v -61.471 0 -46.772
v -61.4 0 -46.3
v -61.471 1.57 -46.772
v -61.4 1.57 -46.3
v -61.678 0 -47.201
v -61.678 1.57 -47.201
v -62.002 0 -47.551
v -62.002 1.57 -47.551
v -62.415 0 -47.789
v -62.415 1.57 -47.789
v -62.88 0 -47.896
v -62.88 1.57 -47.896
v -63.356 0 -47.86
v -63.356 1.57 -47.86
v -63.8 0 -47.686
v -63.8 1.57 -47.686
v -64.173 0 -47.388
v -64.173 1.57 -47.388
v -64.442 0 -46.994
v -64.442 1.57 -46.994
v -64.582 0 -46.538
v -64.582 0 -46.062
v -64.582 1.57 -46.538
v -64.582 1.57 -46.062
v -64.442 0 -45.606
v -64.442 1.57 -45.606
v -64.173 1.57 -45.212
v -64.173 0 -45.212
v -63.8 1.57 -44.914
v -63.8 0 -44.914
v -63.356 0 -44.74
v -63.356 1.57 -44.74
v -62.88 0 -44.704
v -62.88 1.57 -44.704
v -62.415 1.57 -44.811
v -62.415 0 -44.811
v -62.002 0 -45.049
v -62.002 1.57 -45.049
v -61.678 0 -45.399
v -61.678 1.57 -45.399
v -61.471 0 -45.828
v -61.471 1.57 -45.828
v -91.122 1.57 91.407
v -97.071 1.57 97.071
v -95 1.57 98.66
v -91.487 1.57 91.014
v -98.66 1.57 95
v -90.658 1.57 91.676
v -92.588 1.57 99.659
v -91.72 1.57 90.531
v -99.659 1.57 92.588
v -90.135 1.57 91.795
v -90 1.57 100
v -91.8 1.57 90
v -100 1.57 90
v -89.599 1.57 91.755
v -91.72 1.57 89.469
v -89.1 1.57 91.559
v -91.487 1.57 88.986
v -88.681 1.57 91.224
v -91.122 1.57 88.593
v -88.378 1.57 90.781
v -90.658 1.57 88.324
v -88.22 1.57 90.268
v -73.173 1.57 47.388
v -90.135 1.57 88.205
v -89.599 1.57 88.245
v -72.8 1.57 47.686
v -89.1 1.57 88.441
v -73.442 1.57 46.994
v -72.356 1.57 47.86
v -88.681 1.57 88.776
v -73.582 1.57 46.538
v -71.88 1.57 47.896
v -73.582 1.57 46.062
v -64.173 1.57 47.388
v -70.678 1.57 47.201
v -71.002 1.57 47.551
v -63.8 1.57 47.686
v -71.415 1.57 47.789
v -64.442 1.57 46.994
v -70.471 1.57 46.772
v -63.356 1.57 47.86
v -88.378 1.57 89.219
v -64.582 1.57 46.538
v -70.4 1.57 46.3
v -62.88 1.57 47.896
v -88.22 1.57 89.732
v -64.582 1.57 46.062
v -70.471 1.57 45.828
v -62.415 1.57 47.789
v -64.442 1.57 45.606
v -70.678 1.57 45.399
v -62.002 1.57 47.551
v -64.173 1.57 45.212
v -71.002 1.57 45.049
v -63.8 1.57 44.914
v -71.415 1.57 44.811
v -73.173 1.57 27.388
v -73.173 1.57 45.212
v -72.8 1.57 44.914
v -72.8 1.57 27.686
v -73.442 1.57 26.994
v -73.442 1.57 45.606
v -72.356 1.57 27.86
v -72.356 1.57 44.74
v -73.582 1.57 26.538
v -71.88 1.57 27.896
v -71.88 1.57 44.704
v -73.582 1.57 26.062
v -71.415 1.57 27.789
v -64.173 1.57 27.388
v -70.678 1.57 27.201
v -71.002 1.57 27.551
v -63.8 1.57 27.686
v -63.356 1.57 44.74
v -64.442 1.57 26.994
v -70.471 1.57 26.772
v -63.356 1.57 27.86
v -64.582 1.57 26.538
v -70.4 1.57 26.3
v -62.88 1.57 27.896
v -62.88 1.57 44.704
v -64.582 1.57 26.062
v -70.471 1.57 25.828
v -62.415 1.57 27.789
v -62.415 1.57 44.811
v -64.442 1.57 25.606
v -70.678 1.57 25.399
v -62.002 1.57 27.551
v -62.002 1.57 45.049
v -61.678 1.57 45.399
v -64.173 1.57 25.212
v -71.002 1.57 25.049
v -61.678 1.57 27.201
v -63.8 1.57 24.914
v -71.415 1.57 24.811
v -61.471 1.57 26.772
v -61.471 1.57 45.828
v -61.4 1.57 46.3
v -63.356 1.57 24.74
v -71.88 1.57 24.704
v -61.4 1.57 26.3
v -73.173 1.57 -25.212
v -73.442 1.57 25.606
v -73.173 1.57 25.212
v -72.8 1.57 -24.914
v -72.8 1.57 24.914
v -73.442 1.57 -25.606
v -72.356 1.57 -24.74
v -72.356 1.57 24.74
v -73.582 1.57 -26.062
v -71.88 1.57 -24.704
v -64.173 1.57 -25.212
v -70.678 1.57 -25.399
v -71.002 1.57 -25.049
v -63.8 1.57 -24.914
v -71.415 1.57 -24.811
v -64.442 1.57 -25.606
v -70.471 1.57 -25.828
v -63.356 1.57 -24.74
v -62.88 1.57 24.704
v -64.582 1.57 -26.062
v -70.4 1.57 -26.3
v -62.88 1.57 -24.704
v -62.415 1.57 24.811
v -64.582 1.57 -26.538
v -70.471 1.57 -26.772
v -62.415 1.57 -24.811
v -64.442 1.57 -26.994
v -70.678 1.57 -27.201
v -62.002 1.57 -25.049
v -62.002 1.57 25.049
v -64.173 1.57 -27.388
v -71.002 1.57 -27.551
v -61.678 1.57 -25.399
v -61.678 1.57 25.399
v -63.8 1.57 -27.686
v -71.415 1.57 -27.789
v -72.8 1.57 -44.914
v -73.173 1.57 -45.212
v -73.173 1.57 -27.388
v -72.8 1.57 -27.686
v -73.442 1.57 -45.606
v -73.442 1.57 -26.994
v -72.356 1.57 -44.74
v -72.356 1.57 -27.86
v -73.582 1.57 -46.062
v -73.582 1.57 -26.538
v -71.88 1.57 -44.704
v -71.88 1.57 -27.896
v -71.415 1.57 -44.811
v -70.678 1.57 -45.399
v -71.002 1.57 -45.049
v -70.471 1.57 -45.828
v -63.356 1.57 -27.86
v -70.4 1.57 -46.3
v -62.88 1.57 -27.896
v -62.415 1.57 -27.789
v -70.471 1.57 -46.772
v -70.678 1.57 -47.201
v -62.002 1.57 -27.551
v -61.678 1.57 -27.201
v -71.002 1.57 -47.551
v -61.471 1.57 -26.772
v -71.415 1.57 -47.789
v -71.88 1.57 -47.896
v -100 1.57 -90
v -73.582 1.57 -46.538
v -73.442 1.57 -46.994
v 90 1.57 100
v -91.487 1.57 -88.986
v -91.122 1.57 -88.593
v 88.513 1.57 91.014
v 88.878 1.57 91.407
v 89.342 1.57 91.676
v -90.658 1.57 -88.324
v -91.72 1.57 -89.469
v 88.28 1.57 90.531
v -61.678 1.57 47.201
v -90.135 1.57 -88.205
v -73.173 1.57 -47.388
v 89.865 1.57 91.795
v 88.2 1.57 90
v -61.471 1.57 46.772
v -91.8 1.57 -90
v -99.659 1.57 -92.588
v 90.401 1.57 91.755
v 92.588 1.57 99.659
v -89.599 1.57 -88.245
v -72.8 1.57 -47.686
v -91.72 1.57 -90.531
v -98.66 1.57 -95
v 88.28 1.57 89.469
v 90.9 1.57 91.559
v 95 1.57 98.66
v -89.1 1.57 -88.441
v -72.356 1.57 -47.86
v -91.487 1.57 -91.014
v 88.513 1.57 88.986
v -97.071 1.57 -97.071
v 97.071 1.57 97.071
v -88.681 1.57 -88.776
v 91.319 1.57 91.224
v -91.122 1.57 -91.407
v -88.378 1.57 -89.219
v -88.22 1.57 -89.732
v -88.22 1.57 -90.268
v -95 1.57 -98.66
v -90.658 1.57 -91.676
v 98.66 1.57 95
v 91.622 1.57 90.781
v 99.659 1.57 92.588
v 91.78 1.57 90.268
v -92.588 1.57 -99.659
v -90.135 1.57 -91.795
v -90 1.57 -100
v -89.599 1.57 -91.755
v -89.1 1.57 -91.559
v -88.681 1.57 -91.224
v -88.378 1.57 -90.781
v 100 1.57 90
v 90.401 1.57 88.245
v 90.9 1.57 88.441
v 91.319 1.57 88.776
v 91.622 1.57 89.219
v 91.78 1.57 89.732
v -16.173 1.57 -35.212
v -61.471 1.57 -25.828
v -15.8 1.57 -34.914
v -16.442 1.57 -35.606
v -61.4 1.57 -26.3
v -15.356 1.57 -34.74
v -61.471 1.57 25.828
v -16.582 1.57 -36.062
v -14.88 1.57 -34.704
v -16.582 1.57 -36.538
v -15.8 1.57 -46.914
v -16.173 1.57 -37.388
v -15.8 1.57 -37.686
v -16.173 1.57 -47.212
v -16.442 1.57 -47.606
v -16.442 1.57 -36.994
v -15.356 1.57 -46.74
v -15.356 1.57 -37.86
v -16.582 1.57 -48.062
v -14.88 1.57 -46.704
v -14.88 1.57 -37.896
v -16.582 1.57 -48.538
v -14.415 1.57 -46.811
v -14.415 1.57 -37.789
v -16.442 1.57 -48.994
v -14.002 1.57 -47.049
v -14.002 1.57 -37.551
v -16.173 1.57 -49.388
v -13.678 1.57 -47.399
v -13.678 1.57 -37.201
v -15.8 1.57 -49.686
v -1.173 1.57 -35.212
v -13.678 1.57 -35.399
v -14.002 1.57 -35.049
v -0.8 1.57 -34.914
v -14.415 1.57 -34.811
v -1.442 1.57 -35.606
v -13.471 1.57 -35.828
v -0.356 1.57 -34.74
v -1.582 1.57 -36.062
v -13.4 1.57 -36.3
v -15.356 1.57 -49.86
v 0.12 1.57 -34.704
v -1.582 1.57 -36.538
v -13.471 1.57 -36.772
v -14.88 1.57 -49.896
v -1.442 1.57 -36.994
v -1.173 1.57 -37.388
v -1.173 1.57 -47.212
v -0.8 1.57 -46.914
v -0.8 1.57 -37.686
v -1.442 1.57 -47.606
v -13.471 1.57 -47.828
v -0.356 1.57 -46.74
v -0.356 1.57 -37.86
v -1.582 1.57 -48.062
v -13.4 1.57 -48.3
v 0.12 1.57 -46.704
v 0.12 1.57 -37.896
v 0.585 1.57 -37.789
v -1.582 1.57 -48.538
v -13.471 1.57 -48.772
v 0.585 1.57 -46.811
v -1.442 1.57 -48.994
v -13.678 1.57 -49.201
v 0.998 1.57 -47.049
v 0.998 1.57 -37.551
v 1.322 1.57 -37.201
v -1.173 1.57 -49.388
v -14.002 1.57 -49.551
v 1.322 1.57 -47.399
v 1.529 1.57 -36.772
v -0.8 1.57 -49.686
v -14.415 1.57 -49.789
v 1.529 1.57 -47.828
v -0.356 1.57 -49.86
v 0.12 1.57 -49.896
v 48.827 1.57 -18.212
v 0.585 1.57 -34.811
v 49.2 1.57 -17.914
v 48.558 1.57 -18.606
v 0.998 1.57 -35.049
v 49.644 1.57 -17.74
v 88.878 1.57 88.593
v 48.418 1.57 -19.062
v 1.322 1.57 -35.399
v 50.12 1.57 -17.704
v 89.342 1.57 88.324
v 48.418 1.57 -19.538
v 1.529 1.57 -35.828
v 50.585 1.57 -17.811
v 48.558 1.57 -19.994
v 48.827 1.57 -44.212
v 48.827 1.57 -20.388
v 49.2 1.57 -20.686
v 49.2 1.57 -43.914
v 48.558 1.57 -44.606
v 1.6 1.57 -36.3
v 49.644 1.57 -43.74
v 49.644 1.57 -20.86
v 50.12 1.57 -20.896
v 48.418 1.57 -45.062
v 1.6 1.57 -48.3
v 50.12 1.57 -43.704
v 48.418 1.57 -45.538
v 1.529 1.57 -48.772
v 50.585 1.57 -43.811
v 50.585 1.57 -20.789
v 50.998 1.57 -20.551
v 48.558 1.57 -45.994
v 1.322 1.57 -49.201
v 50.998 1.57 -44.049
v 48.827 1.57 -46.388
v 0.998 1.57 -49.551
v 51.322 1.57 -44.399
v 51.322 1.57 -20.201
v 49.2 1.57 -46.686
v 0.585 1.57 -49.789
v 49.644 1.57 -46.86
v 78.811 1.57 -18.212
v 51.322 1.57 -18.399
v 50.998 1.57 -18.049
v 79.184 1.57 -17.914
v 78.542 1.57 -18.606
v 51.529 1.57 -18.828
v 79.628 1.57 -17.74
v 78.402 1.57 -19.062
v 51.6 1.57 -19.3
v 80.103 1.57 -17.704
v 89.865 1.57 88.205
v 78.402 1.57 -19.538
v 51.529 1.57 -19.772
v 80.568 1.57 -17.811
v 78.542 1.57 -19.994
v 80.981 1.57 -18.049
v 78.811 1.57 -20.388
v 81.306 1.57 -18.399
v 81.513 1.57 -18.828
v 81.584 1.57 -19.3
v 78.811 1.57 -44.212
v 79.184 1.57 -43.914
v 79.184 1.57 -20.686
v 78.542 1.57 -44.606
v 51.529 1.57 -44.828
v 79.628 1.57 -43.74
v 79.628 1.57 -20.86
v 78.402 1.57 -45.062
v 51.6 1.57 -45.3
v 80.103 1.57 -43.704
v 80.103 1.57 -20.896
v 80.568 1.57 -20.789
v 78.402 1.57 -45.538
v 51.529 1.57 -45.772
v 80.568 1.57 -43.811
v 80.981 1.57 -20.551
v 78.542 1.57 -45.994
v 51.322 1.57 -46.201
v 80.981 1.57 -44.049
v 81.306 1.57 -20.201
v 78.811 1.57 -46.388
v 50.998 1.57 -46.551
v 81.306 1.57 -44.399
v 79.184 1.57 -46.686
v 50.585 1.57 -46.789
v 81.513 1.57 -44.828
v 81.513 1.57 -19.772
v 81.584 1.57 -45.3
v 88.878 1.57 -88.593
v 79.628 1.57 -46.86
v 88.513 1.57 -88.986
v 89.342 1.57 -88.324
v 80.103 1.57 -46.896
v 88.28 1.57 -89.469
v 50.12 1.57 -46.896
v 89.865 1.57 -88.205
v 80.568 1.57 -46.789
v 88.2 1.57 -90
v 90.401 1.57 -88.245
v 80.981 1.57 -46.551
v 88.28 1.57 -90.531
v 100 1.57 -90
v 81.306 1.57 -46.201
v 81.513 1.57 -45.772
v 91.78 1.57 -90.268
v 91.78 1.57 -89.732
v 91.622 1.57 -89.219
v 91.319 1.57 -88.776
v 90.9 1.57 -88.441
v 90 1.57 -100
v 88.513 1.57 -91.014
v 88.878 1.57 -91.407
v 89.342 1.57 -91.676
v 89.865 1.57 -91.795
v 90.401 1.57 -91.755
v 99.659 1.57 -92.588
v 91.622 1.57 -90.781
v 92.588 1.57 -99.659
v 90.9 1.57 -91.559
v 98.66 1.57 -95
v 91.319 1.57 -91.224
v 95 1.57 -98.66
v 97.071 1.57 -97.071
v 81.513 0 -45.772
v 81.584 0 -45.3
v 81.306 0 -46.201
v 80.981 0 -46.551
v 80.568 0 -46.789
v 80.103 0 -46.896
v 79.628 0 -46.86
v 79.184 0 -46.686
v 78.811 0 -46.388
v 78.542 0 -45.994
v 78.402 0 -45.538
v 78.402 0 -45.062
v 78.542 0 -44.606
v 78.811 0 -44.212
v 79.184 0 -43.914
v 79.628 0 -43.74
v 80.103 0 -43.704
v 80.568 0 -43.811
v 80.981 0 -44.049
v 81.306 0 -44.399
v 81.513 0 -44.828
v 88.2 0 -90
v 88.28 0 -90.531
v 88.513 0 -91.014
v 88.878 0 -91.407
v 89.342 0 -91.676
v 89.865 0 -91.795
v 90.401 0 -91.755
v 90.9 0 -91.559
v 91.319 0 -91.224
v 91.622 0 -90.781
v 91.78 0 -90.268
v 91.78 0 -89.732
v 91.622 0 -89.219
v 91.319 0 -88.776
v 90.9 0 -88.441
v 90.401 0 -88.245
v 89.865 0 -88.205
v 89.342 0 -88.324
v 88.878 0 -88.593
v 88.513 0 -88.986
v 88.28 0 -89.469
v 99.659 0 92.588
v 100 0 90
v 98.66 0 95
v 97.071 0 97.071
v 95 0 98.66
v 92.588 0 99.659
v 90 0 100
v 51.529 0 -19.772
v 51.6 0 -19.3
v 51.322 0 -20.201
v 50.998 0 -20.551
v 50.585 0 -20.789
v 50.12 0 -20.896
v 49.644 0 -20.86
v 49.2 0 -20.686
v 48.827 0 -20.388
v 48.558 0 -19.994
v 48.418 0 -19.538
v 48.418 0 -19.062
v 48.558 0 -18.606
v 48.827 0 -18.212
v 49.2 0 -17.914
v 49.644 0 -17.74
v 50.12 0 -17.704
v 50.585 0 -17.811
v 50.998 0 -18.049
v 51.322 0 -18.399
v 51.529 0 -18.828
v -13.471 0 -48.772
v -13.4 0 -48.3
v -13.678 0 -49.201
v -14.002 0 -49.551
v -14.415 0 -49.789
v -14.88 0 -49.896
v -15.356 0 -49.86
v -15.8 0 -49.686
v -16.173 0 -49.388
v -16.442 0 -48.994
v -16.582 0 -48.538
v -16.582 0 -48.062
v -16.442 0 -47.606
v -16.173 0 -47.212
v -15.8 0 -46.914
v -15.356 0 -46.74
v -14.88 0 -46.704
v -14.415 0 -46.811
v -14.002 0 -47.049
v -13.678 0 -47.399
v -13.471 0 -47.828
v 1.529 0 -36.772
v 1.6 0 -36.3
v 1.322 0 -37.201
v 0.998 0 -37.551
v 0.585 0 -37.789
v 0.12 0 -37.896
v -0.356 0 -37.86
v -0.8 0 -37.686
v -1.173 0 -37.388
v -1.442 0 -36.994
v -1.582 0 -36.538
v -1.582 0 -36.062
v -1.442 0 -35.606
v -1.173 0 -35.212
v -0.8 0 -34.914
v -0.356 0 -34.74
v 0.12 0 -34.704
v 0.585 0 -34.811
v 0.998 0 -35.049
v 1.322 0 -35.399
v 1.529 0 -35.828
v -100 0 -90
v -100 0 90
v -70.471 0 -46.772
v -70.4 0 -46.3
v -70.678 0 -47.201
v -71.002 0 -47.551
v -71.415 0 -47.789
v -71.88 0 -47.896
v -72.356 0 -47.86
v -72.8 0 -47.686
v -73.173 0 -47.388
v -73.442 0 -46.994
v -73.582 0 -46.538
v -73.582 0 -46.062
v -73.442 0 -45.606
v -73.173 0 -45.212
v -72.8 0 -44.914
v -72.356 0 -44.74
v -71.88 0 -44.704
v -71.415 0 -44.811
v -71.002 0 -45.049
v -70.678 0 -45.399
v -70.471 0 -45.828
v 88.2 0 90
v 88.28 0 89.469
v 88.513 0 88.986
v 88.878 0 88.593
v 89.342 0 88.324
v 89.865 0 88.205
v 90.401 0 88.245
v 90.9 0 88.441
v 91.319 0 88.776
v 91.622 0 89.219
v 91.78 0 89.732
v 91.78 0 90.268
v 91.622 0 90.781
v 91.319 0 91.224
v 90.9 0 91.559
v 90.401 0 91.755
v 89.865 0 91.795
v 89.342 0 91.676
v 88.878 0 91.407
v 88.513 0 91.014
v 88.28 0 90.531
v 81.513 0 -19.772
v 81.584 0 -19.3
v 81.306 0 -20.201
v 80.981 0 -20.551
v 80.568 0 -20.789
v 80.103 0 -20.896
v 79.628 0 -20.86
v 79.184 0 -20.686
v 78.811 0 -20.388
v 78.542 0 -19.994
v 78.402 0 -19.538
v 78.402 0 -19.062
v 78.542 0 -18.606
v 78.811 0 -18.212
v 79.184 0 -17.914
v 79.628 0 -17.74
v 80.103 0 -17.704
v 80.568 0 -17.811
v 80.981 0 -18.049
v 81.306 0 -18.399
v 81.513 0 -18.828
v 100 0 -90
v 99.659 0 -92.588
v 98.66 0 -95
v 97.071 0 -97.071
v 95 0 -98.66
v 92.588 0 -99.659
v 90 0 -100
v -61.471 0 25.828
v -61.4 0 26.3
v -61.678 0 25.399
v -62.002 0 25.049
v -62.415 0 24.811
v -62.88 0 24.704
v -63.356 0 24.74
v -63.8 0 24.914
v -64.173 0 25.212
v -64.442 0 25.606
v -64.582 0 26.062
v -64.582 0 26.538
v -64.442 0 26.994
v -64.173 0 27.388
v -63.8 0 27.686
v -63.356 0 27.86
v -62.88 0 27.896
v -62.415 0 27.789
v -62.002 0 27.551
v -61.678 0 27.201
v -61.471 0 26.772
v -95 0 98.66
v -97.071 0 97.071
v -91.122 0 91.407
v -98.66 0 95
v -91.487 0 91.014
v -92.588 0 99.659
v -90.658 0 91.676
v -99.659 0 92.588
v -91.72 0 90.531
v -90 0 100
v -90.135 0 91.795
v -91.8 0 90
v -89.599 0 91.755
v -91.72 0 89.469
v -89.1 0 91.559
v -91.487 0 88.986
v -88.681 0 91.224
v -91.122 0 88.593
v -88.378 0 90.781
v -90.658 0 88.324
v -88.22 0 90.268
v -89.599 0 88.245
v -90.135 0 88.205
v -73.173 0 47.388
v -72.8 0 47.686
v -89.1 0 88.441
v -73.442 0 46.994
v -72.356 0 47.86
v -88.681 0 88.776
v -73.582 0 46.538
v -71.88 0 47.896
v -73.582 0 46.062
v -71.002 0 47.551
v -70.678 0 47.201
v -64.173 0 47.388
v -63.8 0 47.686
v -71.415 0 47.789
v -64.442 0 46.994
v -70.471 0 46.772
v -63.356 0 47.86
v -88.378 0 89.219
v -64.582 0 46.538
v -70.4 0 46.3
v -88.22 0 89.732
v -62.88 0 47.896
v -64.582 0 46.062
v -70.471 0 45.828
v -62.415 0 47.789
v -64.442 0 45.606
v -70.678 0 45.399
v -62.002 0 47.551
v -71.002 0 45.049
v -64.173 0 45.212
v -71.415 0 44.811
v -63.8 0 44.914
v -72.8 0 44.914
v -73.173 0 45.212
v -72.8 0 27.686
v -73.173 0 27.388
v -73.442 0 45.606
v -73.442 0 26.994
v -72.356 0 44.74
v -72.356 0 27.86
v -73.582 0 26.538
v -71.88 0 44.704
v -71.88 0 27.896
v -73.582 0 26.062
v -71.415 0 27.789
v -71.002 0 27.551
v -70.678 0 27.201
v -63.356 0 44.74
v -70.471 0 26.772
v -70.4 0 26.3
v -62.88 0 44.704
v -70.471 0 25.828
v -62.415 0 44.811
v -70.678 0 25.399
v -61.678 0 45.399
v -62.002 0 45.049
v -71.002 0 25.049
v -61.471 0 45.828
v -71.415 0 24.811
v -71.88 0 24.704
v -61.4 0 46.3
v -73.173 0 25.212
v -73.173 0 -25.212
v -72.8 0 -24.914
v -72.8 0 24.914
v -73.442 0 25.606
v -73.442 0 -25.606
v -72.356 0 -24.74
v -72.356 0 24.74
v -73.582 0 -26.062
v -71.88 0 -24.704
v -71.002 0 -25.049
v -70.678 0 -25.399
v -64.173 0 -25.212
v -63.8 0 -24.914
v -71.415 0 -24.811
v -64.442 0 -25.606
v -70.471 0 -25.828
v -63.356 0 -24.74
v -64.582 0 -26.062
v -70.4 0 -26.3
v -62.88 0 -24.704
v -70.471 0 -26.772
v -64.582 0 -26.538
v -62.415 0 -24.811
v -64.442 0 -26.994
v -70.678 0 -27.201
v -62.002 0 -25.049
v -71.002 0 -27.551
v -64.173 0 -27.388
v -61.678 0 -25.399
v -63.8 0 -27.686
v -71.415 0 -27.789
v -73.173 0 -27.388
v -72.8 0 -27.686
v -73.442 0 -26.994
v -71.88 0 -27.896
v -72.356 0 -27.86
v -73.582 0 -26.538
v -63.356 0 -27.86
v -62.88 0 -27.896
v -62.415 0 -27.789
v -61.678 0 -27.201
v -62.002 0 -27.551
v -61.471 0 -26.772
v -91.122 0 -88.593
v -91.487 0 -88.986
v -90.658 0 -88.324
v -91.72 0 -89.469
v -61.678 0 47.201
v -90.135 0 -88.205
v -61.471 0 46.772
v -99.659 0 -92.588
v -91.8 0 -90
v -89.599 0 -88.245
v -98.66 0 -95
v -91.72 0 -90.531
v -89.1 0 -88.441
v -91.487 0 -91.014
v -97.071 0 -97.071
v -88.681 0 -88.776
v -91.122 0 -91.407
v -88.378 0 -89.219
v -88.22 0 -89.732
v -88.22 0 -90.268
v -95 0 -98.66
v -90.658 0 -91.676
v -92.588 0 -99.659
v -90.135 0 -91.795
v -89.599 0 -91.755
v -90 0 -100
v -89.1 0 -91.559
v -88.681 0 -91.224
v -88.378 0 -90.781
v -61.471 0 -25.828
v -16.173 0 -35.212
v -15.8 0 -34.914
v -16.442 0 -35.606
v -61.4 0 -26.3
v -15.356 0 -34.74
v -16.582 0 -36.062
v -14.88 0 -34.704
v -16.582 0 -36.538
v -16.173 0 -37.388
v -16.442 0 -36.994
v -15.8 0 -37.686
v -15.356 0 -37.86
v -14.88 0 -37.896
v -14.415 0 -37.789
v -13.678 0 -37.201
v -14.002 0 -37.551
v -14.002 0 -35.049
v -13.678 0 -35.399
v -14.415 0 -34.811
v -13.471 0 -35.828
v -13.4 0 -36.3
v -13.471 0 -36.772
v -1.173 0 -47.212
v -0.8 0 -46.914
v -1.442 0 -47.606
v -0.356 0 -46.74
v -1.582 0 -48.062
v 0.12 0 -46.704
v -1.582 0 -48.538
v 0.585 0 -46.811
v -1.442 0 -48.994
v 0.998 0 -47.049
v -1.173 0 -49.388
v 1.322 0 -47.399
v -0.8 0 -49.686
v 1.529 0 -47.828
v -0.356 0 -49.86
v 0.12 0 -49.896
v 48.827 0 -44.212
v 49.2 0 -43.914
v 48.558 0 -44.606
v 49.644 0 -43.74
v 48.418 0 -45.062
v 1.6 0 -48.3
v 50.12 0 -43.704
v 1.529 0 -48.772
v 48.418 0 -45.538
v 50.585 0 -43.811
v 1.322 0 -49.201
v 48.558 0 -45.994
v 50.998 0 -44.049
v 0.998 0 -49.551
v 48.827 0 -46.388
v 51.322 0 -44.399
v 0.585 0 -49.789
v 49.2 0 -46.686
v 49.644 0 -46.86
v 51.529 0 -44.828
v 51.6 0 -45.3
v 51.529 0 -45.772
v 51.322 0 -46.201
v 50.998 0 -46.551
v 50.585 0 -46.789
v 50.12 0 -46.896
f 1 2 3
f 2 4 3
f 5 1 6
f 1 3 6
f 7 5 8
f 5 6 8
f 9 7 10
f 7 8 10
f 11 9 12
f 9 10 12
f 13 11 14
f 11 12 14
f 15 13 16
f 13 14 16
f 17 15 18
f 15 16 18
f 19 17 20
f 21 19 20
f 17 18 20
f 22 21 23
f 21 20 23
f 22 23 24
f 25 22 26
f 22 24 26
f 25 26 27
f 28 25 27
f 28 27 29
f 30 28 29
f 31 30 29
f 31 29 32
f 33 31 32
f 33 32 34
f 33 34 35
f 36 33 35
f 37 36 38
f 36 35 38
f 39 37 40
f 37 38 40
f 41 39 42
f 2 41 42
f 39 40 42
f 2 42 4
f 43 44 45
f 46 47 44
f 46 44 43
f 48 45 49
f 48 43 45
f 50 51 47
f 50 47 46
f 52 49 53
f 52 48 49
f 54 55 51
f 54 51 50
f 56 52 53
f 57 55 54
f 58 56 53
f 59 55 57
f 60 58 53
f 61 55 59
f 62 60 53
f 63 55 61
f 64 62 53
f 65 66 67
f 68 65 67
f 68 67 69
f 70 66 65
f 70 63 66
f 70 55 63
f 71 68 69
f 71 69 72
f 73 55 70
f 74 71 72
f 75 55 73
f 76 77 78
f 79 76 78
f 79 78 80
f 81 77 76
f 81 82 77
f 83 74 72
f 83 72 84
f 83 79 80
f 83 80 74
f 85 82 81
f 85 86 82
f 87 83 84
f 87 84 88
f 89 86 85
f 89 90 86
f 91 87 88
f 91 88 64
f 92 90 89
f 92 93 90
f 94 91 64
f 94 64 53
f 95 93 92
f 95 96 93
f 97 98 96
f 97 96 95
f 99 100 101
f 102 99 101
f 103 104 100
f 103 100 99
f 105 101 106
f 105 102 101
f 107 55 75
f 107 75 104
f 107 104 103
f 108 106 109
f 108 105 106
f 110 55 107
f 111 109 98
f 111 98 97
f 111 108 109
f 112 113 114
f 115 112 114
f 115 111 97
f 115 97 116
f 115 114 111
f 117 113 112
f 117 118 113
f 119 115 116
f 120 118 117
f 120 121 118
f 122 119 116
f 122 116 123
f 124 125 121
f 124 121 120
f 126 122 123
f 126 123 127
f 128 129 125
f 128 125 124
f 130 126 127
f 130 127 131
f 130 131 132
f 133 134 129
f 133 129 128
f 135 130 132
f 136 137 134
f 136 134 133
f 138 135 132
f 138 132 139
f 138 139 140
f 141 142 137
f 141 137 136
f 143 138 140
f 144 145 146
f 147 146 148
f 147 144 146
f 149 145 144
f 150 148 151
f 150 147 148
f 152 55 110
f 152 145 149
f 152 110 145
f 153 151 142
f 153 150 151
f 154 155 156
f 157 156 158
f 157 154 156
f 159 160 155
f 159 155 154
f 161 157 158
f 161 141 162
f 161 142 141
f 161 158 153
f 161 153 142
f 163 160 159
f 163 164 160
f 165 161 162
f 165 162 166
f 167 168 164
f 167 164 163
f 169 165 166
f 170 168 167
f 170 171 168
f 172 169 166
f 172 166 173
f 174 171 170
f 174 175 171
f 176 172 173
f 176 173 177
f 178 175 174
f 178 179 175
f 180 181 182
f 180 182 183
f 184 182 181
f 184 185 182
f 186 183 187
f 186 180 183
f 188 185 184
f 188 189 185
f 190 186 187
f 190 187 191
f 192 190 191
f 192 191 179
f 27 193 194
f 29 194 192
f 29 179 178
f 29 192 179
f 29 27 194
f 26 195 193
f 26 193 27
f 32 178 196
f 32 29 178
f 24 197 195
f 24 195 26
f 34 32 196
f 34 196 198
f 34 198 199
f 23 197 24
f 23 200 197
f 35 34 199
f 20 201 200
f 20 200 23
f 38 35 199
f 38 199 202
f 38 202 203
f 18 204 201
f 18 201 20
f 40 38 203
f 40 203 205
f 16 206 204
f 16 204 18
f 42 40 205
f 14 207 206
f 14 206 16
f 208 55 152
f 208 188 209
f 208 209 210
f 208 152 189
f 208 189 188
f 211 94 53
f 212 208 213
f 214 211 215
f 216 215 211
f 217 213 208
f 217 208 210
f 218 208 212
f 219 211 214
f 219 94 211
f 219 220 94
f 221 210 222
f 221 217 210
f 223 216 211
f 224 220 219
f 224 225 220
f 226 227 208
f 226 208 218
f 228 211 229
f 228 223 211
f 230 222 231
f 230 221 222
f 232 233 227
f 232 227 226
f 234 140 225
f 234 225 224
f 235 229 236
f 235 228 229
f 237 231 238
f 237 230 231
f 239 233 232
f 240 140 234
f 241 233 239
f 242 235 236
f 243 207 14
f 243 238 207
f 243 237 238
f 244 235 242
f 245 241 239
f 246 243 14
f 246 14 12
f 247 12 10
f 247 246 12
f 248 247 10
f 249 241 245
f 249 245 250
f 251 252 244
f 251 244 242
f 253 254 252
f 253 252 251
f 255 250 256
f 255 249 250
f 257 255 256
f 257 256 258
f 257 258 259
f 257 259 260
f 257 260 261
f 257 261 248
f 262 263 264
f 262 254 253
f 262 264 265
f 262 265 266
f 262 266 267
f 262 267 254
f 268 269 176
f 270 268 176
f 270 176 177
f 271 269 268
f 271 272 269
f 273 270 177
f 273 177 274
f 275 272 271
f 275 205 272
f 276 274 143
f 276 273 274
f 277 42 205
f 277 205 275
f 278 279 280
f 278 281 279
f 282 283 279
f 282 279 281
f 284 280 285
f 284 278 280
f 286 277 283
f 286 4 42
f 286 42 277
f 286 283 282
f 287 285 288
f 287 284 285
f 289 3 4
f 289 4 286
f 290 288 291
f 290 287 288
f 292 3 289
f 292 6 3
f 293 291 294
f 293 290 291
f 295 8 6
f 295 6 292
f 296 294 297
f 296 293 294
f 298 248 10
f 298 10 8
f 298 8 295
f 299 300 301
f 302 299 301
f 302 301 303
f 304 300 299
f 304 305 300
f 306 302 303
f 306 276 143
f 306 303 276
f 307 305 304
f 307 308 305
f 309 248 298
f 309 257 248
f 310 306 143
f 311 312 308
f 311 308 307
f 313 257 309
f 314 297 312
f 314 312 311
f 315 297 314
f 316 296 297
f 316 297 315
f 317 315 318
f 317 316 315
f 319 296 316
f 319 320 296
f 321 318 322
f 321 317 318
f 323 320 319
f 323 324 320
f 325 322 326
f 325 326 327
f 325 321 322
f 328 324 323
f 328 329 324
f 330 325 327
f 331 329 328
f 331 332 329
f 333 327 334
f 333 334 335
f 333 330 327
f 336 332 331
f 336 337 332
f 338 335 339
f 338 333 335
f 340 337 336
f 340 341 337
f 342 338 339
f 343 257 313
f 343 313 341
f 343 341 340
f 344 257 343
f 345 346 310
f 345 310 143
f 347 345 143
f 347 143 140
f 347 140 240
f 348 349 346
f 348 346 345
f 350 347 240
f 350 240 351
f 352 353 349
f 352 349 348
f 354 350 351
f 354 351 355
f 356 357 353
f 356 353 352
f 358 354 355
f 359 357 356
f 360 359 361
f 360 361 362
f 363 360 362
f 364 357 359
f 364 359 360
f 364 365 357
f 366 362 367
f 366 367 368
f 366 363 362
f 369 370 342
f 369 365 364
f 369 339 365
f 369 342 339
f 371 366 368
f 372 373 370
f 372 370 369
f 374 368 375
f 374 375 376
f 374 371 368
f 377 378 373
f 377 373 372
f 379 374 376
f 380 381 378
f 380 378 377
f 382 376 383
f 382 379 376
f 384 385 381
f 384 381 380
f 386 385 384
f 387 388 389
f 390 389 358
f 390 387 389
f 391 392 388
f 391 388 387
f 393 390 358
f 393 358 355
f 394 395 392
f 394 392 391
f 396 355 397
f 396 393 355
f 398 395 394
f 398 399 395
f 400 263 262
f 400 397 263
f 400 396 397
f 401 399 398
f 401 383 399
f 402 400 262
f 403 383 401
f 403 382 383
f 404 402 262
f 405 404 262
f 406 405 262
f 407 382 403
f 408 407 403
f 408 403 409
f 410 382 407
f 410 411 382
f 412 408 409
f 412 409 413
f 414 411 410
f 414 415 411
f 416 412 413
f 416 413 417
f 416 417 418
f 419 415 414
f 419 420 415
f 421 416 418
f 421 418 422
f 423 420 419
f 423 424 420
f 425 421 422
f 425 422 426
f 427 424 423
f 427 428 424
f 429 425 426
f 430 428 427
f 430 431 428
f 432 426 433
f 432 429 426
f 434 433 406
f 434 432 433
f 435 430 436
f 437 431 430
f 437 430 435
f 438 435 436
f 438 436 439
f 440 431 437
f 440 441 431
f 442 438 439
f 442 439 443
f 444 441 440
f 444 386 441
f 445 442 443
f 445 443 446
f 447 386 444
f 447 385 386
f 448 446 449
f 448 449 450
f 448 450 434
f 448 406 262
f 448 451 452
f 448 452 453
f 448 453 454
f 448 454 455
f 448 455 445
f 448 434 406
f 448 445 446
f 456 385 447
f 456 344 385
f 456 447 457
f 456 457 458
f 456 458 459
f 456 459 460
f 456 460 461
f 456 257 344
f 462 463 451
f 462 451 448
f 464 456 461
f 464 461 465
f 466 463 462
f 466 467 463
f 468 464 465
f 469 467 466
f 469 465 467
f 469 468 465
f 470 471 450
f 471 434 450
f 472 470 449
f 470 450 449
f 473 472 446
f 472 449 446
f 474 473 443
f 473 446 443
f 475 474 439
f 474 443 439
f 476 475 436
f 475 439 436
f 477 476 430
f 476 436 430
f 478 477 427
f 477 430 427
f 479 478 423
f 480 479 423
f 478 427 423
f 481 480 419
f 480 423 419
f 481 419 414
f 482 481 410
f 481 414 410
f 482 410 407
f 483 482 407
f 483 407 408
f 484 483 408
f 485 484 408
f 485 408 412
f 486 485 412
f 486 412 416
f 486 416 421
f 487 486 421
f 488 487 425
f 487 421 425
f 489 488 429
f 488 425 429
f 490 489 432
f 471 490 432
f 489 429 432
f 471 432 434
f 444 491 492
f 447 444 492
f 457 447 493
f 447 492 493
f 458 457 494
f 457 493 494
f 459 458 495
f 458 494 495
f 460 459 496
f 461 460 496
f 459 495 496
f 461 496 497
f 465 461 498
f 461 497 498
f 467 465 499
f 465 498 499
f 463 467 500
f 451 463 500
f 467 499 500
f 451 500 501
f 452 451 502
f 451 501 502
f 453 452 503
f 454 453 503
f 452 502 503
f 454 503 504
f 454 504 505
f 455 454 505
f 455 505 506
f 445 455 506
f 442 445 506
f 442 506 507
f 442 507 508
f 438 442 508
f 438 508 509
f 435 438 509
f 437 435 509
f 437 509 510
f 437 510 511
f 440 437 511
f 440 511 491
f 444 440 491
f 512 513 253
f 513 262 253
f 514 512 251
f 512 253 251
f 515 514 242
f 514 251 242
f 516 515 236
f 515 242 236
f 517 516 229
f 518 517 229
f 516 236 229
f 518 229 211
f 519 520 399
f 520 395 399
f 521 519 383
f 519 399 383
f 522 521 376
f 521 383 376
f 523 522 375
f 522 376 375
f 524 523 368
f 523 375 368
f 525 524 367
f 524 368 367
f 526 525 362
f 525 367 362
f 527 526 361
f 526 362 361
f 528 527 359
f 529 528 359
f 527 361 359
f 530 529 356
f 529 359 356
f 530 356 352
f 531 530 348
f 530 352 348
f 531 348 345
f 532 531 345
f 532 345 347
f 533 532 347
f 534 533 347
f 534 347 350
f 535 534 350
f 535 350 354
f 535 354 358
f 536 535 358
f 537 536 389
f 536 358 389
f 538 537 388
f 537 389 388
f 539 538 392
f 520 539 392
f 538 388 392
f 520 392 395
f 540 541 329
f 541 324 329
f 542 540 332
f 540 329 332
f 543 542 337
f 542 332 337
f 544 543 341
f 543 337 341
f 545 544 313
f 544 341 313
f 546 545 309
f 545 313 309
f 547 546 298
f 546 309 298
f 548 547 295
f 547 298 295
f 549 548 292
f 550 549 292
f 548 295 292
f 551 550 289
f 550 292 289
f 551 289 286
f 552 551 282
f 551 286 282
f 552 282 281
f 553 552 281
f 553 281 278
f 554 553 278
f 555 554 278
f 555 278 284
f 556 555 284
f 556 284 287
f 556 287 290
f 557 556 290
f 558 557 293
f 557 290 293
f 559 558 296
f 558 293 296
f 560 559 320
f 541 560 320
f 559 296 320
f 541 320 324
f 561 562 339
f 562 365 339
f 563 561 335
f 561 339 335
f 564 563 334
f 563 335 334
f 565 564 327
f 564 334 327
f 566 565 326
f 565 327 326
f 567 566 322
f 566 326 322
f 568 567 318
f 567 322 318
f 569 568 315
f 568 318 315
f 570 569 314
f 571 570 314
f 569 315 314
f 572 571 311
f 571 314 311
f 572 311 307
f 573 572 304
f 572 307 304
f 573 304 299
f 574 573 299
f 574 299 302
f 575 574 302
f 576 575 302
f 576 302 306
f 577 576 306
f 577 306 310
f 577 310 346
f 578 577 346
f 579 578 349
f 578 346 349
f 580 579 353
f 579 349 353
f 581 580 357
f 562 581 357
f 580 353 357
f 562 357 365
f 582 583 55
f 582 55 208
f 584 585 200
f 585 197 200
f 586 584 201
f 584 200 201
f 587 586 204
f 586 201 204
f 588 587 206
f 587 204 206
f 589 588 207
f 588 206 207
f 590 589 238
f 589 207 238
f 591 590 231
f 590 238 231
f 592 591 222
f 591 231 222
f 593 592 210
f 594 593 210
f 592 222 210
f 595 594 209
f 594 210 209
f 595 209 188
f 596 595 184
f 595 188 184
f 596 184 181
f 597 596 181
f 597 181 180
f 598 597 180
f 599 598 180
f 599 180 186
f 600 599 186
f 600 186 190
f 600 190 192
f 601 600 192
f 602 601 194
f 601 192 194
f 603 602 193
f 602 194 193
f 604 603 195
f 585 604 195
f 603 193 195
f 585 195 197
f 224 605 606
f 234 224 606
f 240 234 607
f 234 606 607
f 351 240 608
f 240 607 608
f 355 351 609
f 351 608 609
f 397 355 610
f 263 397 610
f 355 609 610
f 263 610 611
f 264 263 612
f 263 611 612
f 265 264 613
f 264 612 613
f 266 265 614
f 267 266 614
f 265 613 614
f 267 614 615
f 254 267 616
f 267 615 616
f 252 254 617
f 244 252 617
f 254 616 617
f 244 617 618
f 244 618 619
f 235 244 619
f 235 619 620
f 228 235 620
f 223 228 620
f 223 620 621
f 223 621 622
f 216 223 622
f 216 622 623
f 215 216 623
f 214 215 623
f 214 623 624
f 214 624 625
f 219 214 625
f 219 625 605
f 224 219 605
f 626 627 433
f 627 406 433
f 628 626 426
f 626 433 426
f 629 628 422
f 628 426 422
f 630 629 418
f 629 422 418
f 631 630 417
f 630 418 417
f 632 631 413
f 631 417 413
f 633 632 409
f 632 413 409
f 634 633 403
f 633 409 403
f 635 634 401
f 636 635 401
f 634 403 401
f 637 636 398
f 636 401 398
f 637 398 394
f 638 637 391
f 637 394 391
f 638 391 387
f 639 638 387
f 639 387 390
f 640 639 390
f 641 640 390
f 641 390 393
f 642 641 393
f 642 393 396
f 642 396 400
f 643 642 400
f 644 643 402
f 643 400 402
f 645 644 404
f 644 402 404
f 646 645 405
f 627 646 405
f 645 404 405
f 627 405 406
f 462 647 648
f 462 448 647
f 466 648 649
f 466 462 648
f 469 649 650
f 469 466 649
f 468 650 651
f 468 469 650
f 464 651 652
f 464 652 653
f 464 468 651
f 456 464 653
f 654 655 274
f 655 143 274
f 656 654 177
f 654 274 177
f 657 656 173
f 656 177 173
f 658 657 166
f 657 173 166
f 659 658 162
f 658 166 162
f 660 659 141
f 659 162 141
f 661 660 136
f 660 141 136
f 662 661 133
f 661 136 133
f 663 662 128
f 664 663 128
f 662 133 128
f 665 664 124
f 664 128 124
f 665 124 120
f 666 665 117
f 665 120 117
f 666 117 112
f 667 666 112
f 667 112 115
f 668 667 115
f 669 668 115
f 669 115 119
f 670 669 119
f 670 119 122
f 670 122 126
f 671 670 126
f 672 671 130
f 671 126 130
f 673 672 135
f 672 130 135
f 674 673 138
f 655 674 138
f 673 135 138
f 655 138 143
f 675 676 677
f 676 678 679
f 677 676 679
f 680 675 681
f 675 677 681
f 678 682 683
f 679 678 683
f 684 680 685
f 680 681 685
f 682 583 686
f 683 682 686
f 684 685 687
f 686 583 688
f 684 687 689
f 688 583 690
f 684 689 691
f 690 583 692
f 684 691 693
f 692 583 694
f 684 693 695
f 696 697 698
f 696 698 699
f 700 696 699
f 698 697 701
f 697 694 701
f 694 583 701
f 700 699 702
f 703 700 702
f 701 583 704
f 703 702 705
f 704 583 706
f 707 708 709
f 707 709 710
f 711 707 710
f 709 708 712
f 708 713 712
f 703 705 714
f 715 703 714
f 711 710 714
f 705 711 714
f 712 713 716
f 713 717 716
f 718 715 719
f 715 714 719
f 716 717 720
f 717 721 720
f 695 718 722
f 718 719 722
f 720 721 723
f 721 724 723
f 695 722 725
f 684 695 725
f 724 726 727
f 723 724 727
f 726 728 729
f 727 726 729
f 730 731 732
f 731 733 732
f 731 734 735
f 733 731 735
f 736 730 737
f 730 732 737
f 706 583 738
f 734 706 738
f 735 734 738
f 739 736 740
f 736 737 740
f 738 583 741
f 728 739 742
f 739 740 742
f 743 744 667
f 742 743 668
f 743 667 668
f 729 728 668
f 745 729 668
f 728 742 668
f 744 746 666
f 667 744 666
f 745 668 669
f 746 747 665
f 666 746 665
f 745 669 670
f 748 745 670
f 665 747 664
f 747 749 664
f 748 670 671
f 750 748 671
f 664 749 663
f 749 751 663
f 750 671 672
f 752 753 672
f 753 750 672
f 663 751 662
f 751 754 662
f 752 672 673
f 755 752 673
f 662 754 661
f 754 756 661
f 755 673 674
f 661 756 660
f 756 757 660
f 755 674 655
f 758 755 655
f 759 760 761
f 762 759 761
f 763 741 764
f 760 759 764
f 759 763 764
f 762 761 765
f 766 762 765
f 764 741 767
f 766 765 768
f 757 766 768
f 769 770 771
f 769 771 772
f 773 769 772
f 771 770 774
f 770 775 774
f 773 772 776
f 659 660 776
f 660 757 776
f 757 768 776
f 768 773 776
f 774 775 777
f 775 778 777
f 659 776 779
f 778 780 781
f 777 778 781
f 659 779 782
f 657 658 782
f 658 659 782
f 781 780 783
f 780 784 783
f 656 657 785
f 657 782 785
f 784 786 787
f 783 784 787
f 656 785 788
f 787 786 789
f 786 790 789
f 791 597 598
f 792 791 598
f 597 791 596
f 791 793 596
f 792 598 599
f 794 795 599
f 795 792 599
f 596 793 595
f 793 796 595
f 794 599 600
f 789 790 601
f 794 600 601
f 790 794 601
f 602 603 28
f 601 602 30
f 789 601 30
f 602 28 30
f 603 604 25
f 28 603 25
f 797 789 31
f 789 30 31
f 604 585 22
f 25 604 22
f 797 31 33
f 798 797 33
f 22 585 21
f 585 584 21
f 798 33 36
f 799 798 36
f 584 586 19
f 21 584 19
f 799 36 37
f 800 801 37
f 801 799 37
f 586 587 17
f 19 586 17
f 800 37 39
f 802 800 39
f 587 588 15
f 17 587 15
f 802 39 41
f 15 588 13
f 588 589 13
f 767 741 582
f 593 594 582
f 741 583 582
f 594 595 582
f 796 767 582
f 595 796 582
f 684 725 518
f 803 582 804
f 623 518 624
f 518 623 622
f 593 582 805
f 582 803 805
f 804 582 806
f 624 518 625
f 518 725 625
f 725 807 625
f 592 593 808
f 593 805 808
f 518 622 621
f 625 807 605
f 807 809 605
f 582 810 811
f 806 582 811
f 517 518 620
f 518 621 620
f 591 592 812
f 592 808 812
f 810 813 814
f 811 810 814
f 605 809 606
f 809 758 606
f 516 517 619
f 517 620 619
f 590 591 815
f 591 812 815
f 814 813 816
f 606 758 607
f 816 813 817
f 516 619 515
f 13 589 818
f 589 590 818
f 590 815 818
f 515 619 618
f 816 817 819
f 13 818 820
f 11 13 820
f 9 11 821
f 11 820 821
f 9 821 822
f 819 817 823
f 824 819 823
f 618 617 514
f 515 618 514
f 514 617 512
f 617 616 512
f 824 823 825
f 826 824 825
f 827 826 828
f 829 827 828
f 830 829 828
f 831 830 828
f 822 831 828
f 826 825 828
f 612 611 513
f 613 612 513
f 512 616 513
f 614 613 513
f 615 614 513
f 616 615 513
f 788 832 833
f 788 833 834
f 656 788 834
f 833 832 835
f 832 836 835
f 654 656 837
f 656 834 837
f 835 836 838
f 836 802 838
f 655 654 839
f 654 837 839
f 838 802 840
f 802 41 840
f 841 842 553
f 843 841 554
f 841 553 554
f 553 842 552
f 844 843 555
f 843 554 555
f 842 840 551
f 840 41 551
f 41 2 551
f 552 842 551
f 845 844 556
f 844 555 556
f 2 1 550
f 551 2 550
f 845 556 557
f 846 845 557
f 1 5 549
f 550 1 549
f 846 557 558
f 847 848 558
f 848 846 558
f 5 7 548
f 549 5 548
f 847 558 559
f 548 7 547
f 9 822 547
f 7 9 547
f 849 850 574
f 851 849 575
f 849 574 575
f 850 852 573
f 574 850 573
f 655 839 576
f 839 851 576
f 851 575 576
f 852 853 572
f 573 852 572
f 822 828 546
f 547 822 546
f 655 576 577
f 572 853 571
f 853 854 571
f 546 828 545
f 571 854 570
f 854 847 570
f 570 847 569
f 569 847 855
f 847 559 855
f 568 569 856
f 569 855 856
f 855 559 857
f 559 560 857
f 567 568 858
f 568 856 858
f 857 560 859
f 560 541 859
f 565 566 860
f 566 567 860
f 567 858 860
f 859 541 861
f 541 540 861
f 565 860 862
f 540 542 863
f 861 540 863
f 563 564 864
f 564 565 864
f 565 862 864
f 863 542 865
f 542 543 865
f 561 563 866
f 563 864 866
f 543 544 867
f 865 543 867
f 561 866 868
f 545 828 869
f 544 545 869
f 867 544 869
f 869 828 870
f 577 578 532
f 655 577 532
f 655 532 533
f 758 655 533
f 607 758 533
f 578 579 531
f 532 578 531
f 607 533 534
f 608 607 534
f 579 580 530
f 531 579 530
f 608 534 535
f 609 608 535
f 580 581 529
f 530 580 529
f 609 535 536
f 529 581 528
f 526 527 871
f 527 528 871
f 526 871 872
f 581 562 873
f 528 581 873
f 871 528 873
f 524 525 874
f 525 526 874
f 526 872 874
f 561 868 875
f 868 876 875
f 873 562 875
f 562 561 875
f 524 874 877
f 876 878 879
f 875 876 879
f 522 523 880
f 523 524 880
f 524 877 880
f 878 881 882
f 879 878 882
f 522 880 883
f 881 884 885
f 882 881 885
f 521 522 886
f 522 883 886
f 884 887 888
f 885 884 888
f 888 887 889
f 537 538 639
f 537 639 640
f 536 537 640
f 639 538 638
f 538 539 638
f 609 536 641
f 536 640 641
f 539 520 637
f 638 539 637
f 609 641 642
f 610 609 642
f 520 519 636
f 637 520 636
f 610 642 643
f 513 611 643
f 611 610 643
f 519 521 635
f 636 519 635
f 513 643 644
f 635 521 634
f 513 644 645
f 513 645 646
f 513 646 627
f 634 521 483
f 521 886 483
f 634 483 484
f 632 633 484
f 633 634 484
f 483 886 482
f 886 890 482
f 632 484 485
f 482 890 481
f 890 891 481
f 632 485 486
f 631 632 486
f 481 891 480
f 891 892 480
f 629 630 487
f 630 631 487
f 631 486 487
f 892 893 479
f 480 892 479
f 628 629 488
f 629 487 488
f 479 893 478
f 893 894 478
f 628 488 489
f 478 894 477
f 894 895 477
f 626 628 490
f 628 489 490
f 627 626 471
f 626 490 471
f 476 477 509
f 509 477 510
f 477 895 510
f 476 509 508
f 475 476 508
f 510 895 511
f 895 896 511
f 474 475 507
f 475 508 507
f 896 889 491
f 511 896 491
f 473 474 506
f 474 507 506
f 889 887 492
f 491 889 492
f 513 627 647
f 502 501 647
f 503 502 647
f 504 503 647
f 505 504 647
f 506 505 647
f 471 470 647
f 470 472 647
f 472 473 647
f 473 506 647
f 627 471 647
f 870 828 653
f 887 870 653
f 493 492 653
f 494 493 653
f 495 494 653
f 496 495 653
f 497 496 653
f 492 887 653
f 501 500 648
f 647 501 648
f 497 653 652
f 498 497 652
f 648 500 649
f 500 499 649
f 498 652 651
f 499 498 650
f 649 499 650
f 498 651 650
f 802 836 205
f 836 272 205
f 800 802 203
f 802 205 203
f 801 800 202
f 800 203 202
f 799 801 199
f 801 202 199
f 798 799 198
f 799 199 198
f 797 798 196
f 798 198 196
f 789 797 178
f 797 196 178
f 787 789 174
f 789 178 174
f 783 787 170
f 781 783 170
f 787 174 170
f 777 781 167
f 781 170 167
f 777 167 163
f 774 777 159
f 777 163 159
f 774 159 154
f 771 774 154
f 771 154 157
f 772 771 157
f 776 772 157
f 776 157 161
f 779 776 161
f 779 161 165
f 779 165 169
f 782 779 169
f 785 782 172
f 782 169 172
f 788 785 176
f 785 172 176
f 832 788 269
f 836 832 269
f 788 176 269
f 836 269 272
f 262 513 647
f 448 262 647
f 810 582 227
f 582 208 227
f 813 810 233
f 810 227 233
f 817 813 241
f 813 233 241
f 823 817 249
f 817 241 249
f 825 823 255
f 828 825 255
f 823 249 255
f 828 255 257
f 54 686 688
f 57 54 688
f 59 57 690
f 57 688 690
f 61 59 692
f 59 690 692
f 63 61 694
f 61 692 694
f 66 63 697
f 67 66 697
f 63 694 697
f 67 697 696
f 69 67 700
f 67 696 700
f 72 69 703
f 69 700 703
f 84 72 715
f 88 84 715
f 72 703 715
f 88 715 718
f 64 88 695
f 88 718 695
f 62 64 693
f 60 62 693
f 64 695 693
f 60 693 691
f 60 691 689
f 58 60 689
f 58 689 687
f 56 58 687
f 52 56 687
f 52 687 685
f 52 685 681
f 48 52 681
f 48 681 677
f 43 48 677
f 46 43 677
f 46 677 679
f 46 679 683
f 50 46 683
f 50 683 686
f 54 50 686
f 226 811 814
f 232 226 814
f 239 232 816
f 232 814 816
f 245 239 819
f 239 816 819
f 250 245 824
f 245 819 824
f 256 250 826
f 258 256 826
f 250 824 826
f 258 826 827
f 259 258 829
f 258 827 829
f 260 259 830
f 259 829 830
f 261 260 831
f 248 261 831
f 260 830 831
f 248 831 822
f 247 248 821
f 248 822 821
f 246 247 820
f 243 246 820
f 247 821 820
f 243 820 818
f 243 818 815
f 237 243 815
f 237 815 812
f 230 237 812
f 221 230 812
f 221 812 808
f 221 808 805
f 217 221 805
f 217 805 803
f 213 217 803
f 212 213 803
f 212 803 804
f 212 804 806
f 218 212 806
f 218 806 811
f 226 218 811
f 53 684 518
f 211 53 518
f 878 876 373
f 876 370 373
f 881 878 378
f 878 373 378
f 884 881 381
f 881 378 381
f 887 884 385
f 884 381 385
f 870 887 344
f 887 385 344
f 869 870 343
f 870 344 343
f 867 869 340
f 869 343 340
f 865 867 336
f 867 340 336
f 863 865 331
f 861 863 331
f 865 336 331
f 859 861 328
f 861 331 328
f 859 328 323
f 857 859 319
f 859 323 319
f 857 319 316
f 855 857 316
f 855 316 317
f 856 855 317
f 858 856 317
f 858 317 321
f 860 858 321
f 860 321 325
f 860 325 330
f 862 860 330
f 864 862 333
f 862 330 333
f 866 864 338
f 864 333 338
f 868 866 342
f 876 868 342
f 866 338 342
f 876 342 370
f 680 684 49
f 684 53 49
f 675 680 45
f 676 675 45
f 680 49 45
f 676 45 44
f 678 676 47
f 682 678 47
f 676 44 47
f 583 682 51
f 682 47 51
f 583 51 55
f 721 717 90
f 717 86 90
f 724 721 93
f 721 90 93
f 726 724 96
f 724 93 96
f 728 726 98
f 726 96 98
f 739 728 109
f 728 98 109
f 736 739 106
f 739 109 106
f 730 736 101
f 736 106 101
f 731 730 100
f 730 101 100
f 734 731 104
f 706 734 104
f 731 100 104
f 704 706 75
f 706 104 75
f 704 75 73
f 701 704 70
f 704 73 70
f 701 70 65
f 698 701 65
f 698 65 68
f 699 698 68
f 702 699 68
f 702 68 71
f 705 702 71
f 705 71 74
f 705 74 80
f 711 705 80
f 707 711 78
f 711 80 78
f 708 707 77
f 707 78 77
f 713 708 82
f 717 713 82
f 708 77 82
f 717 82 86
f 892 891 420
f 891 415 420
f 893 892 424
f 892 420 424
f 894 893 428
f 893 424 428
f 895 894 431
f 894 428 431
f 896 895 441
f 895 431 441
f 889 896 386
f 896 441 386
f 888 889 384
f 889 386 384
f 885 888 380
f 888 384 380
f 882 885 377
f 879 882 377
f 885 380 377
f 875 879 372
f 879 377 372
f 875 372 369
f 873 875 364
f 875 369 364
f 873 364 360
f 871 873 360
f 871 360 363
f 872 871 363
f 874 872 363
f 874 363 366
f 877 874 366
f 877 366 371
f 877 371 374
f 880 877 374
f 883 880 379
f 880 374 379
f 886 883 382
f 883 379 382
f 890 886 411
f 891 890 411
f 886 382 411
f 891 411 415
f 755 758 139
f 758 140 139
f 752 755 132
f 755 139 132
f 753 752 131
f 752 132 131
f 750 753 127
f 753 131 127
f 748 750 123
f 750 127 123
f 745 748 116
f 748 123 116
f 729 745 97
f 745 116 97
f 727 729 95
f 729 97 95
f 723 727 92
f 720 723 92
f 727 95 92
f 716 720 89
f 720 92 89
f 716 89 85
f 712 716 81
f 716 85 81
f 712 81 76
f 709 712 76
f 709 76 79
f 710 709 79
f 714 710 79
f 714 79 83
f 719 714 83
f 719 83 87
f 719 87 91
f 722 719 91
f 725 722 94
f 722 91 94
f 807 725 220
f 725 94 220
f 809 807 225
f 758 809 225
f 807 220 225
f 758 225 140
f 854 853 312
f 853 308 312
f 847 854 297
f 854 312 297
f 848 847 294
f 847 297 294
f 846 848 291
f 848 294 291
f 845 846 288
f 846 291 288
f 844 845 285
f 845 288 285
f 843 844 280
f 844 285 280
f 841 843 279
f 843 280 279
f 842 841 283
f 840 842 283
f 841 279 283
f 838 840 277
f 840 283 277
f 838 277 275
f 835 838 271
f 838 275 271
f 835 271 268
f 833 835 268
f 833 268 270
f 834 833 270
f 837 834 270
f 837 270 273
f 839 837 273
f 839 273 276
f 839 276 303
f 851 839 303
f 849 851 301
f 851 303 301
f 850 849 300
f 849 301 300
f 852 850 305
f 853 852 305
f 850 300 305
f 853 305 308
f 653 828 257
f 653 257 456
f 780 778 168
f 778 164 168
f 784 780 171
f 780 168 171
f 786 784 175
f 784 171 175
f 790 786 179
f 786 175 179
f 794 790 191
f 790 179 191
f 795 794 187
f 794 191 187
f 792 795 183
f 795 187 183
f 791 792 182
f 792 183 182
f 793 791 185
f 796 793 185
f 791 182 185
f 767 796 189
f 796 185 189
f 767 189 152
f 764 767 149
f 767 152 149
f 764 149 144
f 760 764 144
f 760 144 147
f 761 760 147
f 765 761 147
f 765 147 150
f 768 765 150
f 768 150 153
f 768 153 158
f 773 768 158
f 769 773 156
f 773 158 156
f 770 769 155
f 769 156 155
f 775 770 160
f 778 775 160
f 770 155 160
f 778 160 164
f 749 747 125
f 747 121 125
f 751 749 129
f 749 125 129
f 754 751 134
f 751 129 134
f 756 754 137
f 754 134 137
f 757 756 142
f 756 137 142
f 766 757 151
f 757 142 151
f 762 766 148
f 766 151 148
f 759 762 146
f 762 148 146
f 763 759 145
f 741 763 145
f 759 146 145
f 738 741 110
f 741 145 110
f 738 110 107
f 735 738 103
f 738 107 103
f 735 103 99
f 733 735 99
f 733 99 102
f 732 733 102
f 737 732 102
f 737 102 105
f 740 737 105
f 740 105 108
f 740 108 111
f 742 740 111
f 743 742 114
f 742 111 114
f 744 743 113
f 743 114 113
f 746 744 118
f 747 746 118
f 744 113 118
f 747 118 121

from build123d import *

# Parameters (mm, degrees)
SKETCH2_W                      = 200
SKETCH2_H                      = 200
BOSS_EXTRUDE1_DEPTH            = 1.57
F_3_6_3_6_DIAMETER_HOLE1_D     = 3.6
F_3_6_3_6_DIAMETER_HOLE1_DEPTH = 3.2
F_3_6_3_6_DIAMETER_HOLE1_TIP   = 1.081549114
F_3_2_3_2_DIAMETER_HOLE1_D     = 3.2
F_3_2_3_2_DIAMETER_HOLE1_DEPTH = 1.57
F_3_2_3_2_DIAMETER_HOLE1_TIP   = 0.96137699
FILLET1_R                      = 10
FILLET2_R                      = 10


with BuildPart() as part:
    # Sketch2 → Boss-Extrude1 (new body)
    with BuildSketch(Plane(origin=(0, 0, 0), x_dir=(1, 0, 0), z_dir=(0, 1, 0))):
        Rectangle(SKETCH2_W, SKETCH2_H)
    extrude(amount=BOSS_EXTRUDE1_DEPTH)

    # Ø3.6 (3.6) Diameter Hole1
    with Locations(Plane(origin=(0, 1.57, 0), x_dir=(1, 0, 0), z_dir=(0, 1, 0))):
        with Locations((-90, 90), (90, 90), (90, -90), (-90, -90)):
            Hole(F_3_6_3_6_DIAMETER_HOLE1_D / 2, depth=F_3_6_3_6_DIAMETER_HOLE1_DEPTH)
            with Locations((0, 0, -(F_3_6_3_6_DIAMETER_HOLE1_DEPTH + F_3_6_3_6_DIAMETER_HOLE1_TIP / 2))):  # 118° drill point
                Cone(0, F_3_6_3_6_DIAMETER_HOLE1_D / 2, F_3_6_3_6_DIAMETER_HOLE1_TIP, mode=Mode.SUBTRACT)

    # Ø3.2 (3.2) Diameter Hole1
    with Locations(Plane(origin=(0, 0, 0), x_dir=(-1, 0, 0), z_dir=(0, -1, 0))):
        with Locations((15, 48.3), (0, 48.3), (0, 36.3), (15, 36.3), (63, 46.3), (72, 46.3), (63, 26.3), (72, 26.3), (-50, 45.3), (-79.983681894, 45.3), (-79.983681894, 19.3), (-50, 19.3), (72, -26.3), (63, -26.3), (63, -46.3), (72, -46.3)):
            Hole(F_3_2_3_2_DIAMETER_HOLE1_D / 2, depth=F_3_2_3_2_DIAMETER_HOLE1_DEPTH)
            with Locations((0, 0, -(F_3_2_3_2_DIAMETER_HOLE1_DEPTH + F_3_2_3_2_DIAMETER_HOLE1_TIP / 2))):  # 118° drill point
                Cone(0, F_3_2_3_2_DIAMETER_HOLE1_D / 2, F_3_2_3_2_DIAMETER_HOLE1_TIP, mode=Mode.SUBTRACT)

    # Fillet1
    fillet1_edges = [part.edges().sort_by_distance(p)[0] for p in [
        (100, 0.785, 100),
    ]]
    fillet(fillet1_edges, radius=FILLET1_R)

    # Fillet2
    fillet2_edges = [part.edges().sort_by_distance(p)[0] for p in [
        (-100, 0.785, 100),
        (-100, 0.785, -100),
        (100, 0.785, -100),
    ]]
    fillet(fillet2_edges, radius=FILLET2_R)


solid = part.part
